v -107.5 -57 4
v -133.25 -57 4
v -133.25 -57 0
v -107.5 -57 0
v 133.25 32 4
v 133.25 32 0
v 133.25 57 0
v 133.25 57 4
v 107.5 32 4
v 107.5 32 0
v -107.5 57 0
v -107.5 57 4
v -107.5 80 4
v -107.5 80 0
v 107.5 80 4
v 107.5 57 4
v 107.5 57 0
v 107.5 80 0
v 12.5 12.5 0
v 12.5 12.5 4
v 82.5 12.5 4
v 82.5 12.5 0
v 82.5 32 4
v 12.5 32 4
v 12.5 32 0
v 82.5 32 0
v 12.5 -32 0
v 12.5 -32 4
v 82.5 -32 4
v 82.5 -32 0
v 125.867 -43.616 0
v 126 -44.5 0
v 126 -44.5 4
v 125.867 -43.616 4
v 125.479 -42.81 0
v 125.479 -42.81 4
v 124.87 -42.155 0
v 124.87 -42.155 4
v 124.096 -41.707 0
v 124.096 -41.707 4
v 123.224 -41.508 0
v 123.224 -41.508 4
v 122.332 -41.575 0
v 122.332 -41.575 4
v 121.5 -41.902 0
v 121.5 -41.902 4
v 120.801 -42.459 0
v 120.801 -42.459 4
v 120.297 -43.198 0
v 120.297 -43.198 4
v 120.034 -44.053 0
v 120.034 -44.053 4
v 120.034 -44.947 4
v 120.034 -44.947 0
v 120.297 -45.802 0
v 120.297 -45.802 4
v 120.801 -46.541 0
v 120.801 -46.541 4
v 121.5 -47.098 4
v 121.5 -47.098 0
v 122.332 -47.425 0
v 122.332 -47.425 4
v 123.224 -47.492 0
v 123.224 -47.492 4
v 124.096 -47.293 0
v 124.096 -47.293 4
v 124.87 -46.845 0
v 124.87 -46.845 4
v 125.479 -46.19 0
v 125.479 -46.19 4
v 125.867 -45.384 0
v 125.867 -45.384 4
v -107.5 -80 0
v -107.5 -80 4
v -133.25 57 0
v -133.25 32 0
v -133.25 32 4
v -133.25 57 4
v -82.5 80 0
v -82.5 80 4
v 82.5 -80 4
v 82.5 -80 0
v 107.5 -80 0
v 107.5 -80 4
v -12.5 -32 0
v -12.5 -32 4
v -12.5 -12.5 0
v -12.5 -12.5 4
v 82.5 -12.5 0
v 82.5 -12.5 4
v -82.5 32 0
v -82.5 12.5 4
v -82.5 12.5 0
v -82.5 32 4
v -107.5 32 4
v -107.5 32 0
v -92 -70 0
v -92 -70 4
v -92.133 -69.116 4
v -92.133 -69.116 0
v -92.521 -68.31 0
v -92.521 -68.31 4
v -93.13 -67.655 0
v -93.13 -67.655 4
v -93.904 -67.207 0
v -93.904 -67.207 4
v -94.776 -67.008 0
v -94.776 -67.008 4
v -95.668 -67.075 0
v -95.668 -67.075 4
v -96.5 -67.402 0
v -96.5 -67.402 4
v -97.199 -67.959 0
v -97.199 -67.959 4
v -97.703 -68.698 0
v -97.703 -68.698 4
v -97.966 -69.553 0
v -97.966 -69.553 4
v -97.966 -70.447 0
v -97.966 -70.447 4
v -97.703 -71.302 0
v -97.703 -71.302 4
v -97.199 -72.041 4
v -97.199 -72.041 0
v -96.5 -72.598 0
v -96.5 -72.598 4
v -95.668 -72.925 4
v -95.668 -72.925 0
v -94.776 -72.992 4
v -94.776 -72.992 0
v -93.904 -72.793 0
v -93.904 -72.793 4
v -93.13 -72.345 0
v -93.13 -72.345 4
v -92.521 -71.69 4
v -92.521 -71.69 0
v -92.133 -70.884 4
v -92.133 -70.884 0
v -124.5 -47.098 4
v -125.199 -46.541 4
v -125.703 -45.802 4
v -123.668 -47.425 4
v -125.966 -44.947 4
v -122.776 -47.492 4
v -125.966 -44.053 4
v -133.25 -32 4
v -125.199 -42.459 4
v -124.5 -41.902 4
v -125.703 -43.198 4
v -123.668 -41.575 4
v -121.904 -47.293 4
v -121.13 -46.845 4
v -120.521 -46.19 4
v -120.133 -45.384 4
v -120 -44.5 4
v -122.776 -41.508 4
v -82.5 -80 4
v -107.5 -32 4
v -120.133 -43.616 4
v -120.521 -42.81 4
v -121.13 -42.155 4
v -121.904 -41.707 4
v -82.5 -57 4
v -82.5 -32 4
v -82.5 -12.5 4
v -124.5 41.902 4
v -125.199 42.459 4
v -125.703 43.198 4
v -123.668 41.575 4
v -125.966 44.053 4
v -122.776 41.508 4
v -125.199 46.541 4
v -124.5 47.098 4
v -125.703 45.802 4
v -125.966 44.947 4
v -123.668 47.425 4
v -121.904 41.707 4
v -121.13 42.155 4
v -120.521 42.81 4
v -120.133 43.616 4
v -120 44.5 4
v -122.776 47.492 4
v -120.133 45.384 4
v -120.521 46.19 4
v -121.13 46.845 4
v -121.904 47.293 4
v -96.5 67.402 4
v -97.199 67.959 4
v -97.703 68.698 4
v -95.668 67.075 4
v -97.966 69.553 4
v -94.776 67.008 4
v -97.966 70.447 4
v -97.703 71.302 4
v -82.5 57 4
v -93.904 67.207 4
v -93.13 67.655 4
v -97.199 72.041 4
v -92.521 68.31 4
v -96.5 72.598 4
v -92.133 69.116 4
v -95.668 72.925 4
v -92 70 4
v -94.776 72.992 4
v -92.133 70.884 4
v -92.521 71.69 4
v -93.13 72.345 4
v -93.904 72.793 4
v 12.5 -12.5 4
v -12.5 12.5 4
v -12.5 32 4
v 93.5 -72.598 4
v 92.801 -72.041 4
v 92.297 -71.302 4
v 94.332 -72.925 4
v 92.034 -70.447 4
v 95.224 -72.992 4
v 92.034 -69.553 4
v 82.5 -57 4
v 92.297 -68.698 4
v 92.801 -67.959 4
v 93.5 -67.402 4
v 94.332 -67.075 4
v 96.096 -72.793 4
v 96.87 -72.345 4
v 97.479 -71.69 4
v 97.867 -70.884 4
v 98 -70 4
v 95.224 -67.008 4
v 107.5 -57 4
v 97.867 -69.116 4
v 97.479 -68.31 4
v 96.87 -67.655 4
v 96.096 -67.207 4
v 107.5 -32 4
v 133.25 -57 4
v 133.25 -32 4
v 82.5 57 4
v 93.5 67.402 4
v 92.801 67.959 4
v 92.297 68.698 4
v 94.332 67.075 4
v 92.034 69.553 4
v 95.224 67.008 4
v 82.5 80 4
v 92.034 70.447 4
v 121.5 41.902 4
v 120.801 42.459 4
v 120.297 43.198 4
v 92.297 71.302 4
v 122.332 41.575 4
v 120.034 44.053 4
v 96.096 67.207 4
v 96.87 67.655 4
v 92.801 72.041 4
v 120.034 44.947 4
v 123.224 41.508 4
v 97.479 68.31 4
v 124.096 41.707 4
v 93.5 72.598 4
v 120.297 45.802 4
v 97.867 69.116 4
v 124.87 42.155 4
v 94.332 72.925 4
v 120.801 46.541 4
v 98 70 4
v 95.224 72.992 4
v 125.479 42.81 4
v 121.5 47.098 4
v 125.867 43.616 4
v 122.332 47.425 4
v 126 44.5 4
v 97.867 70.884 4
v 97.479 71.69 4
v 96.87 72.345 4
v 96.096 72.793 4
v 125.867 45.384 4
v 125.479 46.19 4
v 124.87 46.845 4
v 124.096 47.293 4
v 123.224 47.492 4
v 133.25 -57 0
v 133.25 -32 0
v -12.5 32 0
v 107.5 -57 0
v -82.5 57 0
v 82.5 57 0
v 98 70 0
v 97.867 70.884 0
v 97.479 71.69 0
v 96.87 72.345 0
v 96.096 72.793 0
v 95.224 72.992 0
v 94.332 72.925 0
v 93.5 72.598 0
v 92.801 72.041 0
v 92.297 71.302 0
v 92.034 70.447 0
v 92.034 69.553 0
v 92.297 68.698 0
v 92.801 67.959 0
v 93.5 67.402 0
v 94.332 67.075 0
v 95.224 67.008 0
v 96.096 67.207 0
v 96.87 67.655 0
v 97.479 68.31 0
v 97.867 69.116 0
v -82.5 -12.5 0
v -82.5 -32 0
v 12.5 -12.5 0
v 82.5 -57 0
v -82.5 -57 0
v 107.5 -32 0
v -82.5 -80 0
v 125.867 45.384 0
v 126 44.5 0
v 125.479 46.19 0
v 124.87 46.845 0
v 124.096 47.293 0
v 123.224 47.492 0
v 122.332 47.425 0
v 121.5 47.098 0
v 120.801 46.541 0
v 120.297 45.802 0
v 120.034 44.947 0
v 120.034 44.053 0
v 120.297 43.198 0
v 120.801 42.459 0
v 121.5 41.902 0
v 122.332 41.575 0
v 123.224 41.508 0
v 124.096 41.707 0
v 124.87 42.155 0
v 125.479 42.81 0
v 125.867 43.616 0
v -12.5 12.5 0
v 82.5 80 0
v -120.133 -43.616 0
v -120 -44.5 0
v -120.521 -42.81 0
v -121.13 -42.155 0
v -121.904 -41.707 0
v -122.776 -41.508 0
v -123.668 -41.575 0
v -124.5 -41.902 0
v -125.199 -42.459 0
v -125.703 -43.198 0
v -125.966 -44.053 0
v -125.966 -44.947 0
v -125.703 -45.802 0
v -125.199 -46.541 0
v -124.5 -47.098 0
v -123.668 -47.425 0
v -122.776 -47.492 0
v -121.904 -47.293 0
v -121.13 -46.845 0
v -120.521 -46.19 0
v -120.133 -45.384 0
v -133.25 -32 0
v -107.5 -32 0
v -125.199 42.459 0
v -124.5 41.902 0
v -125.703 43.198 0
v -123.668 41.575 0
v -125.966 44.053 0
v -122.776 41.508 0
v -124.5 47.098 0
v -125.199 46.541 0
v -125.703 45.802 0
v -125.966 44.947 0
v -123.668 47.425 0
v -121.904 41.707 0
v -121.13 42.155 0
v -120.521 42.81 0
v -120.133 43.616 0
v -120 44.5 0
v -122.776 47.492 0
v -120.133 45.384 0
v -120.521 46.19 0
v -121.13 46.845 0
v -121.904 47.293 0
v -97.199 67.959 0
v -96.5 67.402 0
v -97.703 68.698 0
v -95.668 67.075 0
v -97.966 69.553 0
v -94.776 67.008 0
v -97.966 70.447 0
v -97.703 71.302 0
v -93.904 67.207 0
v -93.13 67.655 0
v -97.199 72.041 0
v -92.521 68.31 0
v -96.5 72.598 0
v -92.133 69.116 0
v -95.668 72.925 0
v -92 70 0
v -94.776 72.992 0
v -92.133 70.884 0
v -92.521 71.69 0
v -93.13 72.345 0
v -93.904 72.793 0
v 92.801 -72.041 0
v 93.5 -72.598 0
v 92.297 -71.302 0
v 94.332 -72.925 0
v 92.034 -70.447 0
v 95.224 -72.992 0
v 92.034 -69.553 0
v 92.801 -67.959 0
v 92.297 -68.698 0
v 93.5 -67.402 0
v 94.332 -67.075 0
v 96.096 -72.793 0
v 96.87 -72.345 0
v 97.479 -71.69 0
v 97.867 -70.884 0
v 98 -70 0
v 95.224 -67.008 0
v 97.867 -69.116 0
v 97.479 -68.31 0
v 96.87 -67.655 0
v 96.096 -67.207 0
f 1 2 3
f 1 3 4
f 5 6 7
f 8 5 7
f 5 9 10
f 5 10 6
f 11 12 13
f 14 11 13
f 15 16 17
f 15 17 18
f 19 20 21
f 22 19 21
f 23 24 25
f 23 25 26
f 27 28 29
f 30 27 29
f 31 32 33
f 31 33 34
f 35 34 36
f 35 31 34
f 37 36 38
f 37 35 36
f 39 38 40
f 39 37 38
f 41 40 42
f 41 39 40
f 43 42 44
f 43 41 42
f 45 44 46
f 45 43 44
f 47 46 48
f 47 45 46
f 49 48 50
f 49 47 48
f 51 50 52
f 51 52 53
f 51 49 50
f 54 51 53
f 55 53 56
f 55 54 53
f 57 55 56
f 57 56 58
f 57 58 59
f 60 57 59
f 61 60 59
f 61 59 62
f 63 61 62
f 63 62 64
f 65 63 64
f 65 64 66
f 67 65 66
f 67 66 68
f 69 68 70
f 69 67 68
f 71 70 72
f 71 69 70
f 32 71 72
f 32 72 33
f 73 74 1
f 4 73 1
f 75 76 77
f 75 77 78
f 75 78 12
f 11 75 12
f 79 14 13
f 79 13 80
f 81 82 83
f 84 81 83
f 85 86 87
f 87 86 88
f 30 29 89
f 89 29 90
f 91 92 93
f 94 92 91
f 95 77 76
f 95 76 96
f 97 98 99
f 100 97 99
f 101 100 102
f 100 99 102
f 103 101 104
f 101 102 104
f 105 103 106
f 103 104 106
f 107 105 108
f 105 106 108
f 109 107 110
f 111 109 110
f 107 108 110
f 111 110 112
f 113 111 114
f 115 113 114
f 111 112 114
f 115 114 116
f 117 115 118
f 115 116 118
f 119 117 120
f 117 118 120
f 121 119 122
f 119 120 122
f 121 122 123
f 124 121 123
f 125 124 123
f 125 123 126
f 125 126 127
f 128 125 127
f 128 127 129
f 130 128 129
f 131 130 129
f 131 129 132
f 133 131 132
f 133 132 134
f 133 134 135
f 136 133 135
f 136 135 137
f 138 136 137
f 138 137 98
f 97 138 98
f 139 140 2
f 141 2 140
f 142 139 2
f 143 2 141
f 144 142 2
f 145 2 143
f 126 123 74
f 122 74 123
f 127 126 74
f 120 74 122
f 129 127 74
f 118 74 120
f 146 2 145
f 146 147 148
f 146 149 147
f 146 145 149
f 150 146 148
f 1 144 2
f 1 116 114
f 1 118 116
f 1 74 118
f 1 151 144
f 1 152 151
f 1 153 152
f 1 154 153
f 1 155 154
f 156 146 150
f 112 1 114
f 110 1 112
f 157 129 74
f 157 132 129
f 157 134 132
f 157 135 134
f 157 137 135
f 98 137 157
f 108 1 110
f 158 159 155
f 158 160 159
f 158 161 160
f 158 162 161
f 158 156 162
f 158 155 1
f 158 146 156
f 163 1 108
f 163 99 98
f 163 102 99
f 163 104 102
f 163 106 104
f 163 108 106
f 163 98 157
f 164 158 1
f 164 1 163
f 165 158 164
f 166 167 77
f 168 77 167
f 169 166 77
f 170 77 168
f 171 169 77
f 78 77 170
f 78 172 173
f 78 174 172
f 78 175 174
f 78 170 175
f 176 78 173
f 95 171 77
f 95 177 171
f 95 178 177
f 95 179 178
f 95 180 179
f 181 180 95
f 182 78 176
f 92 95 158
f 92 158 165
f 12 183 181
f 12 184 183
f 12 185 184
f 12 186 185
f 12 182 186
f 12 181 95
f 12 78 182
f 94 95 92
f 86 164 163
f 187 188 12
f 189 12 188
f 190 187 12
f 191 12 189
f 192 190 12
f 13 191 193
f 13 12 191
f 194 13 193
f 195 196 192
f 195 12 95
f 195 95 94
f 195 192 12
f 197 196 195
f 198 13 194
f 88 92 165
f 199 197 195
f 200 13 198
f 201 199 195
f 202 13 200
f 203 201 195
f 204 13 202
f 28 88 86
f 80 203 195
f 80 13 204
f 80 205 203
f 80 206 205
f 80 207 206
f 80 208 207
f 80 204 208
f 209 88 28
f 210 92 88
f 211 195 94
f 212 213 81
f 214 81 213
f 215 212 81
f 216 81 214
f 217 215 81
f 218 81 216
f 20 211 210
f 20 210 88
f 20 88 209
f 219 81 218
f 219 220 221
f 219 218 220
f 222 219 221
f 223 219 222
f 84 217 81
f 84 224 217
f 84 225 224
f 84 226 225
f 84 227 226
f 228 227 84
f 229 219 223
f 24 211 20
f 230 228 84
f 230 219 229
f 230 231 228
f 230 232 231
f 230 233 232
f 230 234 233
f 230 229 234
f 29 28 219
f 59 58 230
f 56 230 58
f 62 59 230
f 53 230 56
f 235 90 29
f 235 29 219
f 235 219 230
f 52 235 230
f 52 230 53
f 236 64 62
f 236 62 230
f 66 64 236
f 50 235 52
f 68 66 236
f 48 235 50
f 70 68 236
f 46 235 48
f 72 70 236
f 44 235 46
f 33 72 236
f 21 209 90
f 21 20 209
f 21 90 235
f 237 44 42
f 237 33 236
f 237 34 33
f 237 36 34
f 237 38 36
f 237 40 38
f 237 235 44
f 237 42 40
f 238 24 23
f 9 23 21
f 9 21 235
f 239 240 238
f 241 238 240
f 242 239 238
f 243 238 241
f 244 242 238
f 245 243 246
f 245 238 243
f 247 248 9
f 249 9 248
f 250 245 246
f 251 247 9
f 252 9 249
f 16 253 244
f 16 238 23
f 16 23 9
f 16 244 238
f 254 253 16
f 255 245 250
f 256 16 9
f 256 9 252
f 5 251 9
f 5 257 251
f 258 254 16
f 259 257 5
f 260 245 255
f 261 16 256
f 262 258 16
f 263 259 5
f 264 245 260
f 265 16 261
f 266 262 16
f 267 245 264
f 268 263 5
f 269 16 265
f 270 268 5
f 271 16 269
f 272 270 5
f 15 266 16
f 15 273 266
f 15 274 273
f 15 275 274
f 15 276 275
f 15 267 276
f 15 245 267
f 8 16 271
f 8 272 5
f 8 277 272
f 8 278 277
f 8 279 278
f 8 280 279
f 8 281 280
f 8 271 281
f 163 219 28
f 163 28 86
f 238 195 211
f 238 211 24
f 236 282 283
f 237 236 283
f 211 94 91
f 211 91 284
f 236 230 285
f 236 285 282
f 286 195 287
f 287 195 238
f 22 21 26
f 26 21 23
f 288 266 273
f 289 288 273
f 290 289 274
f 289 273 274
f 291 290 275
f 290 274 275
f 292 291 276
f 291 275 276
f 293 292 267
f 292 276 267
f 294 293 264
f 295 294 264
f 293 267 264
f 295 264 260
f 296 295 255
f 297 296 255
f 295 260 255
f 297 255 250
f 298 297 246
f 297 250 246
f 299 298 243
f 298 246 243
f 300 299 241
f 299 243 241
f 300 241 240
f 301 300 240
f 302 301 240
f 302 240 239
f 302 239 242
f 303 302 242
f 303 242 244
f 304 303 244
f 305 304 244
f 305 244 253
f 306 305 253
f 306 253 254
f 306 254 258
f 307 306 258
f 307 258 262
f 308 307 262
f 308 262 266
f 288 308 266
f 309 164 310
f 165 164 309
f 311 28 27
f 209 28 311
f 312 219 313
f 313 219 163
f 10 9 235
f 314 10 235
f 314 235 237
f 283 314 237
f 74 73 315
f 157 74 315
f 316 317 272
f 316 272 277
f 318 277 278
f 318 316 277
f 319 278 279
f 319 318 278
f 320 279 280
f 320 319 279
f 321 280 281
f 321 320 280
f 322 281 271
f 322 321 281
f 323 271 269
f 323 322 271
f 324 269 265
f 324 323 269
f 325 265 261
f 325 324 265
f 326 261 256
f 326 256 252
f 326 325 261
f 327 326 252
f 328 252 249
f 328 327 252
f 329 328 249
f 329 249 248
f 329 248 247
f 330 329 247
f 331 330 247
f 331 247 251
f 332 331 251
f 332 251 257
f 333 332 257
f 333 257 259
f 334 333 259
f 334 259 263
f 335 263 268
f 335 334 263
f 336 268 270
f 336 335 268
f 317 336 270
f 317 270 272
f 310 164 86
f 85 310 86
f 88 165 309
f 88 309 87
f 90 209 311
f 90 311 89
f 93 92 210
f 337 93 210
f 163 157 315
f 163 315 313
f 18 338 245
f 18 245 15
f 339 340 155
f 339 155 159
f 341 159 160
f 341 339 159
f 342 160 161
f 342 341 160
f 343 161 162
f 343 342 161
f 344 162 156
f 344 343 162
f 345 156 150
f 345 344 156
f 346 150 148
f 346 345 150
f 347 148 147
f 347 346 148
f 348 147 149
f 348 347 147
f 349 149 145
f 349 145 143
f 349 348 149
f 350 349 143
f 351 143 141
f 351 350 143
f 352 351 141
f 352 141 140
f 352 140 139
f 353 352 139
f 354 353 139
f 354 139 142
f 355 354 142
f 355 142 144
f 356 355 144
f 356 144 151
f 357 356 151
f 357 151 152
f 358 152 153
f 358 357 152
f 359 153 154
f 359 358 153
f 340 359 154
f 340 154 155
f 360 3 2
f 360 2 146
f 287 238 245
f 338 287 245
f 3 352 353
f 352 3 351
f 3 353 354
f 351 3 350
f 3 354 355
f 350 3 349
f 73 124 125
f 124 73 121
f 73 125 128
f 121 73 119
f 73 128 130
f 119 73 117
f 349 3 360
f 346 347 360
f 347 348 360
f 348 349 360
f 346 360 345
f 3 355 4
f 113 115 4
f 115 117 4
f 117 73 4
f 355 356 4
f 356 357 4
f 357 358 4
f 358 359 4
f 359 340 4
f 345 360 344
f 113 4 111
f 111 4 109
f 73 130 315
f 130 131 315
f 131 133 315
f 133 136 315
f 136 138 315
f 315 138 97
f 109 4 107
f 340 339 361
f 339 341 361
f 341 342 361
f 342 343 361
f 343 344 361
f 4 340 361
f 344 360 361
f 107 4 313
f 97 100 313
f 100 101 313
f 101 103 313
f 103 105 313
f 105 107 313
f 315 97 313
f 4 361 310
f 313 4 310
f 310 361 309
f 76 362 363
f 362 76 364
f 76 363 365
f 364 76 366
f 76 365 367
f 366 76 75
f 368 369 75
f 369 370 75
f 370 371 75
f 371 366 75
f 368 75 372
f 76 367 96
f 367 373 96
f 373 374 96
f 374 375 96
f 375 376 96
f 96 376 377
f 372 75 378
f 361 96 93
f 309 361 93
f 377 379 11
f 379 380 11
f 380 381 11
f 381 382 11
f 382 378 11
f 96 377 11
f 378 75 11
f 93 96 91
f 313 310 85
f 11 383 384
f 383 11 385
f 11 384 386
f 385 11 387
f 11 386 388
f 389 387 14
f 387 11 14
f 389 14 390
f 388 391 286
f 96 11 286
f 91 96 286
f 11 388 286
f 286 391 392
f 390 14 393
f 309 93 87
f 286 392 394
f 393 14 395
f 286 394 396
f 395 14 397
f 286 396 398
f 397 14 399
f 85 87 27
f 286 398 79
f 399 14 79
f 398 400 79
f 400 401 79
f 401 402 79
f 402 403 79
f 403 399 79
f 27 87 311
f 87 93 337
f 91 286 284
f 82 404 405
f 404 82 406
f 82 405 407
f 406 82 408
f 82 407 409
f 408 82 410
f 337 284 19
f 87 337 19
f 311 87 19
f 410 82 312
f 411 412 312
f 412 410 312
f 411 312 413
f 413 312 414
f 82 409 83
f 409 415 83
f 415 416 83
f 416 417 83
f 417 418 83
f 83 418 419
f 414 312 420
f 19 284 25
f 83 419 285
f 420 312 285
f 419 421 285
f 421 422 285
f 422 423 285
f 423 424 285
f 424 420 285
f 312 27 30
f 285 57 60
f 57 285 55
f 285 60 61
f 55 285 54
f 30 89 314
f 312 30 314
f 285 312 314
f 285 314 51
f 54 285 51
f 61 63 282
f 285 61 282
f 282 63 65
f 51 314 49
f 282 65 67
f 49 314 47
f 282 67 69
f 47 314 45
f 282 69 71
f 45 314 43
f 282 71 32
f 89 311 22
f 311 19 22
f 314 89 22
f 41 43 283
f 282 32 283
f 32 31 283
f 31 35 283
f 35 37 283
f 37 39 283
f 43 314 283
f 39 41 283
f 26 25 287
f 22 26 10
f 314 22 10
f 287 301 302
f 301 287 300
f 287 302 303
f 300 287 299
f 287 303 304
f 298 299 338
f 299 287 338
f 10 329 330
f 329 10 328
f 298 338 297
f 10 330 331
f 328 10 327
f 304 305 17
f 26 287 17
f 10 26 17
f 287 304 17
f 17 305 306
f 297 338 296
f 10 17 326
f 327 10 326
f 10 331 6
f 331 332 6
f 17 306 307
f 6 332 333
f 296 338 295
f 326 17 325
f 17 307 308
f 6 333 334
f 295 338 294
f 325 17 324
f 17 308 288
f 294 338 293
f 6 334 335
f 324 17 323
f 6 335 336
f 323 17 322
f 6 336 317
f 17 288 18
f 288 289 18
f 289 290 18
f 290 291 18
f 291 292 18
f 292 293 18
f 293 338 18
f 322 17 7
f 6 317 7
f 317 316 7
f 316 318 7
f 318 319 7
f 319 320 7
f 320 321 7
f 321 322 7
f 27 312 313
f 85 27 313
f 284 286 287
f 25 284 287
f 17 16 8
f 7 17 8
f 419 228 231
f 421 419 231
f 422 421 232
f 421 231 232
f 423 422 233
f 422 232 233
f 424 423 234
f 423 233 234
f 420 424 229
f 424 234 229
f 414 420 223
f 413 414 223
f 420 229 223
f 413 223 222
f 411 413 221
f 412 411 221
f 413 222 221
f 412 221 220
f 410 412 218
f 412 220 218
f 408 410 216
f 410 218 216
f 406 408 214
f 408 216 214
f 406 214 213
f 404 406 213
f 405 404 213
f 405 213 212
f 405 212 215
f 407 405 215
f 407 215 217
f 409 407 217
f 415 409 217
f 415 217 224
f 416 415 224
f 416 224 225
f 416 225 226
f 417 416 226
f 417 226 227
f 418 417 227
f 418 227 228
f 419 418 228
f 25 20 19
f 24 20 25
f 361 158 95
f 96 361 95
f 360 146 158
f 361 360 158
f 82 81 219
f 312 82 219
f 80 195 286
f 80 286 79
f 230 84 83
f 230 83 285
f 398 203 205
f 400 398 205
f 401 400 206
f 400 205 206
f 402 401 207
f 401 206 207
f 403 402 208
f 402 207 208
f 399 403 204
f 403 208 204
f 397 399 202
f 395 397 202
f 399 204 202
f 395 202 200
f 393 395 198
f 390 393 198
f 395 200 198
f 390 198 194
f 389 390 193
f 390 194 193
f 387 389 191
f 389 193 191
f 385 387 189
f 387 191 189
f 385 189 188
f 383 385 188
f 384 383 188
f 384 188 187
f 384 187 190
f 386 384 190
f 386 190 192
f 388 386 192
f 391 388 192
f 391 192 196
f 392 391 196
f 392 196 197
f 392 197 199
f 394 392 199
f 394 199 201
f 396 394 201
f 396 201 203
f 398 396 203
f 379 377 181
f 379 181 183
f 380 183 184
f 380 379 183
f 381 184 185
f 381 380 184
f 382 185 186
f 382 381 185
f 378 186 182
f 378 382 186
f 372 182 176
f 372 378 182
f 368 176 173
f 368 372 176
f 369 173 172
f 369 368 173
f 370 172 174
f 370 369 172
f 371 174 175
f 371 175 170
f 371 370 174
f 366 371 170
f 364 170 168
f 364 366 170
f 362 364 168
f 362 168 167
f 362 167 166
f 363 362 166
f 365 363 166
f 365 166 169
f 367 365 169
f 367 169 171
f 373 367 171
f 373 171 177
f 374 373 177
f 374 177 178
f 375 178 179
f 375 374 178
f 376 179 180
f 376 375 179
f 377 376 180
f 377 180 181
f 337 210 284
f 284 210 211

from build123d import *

# Parameters (mm, degrees)
F0_W     = 266.5
F0_H     = 160
F0_R     = 3
F1_DEPTH = 4
F2_R     = 3
F3_DEPTH = 4.001
F4_W     = 25.75
F4_H     = 23
F4_W_2   = 82.5
F4_H_2   = 32
F5_DEPTH = 4.001
F6_W     = 70
F6_H     = 19.5
F7_DEPTH = 4.001


with BuildPart() as f1:
    # F0 (on Top) → F1 (new body)
    with BuildSketch(Plane.XY):
        Rectangle(F0_W, F0_H)
        with Locations((-123, -44.5)):
            Circle(F0_R, mode=Mode.SUBTRACT)
        with Locations((123, -44.5)):
            Circle(F0_R, mode=Mode.SUBTRACT)
        with Locations((-123, 44.5)):
            Circle(F0_R, mode=Mode.SUBTRACT)
        with Locations((123, 44.5)):
            Circle(F0_R, mode=Mode.SUBTRACT)
    extrude(amount=F1_DEPTH)

    # F2 (on face) → F3 (cut, through all)
    with BuildSketch(Plane.XY.offset(4)):
        with Locations((-95, 70)):
            Circle(F2_R)
        with Locations((-95, -70)):
            Circle(F2_R)
        with Locations((95, 70)):
            Circle(F2_R)
        with Locations((95, -70)):
            Circle(F2_R)
    extrude(amount=-F3_DEPTH, mode=Mode.SUBTRACT)

    # F4 (on face) → F5 (cut, through all)
    with BuildSketch(Plane.XY.offset(4)):
        with Locations((-120.375, 68.5)):
            Rectangle(F4_W, F4_H)
        with Locations((-41.25, 68.5)):
            Rectangle(F4_W_2, F4_H)
        with Locations((41.25, 68.5)):
            Rectangle(F4_W_2, F4_H)
        with Locations((-120.375, 16)):
            Rectangle(F4_W, F4_H_2)
        with Locations((-120.375, -16)):
            Rectangle(F4_W, F4_H_2)
        with Locations((120.375, 68.5)):
            Rectangle(F4_W, F4_H)
        with Locations((120.375, 16)):
            Rectangle(F4_W, F4_H_2)
        with Locations((120.375, -16)):
            Rectangle(F4_W, F4_H_2)
        with Locations((-41.25, -68.5)):
            Rectangle(F4_W_2, F4_H)
        with Locations((41.25, -68.5)):
            Rectangle(F4_W_2, F4_H)
        with Locations((-120.375, -68.5)):
            Rectangle(F4_W, F4_H)
        with Locations((120.375, -68.5)):
            Rectangle(F4_W, F4_H)
    extrude(amount=-F5_DEPTH, mode=Mode.SUBTRACT)

    # F6 (on face) → F7 (cut, through all)
    with BuildSketch(Plane.XY.offset(4)):
        with Locations((-47.5, 22.25)):
            Rectangle(F6_W, F6_H)
        with Locations((47.5, 22.25)):
            Rectangle(F6_W, F6_H)
        with Locations((47.5, -22.25)):
            Rectangle(F6_W, F6_H)
        with Locations((-47.5, -22.25)):
            Rectangle(F6_W, F6_H)
    extrude(amount=-F7_DEPTH, mode=Mode.SUBTRACT)


solid = f1.part
